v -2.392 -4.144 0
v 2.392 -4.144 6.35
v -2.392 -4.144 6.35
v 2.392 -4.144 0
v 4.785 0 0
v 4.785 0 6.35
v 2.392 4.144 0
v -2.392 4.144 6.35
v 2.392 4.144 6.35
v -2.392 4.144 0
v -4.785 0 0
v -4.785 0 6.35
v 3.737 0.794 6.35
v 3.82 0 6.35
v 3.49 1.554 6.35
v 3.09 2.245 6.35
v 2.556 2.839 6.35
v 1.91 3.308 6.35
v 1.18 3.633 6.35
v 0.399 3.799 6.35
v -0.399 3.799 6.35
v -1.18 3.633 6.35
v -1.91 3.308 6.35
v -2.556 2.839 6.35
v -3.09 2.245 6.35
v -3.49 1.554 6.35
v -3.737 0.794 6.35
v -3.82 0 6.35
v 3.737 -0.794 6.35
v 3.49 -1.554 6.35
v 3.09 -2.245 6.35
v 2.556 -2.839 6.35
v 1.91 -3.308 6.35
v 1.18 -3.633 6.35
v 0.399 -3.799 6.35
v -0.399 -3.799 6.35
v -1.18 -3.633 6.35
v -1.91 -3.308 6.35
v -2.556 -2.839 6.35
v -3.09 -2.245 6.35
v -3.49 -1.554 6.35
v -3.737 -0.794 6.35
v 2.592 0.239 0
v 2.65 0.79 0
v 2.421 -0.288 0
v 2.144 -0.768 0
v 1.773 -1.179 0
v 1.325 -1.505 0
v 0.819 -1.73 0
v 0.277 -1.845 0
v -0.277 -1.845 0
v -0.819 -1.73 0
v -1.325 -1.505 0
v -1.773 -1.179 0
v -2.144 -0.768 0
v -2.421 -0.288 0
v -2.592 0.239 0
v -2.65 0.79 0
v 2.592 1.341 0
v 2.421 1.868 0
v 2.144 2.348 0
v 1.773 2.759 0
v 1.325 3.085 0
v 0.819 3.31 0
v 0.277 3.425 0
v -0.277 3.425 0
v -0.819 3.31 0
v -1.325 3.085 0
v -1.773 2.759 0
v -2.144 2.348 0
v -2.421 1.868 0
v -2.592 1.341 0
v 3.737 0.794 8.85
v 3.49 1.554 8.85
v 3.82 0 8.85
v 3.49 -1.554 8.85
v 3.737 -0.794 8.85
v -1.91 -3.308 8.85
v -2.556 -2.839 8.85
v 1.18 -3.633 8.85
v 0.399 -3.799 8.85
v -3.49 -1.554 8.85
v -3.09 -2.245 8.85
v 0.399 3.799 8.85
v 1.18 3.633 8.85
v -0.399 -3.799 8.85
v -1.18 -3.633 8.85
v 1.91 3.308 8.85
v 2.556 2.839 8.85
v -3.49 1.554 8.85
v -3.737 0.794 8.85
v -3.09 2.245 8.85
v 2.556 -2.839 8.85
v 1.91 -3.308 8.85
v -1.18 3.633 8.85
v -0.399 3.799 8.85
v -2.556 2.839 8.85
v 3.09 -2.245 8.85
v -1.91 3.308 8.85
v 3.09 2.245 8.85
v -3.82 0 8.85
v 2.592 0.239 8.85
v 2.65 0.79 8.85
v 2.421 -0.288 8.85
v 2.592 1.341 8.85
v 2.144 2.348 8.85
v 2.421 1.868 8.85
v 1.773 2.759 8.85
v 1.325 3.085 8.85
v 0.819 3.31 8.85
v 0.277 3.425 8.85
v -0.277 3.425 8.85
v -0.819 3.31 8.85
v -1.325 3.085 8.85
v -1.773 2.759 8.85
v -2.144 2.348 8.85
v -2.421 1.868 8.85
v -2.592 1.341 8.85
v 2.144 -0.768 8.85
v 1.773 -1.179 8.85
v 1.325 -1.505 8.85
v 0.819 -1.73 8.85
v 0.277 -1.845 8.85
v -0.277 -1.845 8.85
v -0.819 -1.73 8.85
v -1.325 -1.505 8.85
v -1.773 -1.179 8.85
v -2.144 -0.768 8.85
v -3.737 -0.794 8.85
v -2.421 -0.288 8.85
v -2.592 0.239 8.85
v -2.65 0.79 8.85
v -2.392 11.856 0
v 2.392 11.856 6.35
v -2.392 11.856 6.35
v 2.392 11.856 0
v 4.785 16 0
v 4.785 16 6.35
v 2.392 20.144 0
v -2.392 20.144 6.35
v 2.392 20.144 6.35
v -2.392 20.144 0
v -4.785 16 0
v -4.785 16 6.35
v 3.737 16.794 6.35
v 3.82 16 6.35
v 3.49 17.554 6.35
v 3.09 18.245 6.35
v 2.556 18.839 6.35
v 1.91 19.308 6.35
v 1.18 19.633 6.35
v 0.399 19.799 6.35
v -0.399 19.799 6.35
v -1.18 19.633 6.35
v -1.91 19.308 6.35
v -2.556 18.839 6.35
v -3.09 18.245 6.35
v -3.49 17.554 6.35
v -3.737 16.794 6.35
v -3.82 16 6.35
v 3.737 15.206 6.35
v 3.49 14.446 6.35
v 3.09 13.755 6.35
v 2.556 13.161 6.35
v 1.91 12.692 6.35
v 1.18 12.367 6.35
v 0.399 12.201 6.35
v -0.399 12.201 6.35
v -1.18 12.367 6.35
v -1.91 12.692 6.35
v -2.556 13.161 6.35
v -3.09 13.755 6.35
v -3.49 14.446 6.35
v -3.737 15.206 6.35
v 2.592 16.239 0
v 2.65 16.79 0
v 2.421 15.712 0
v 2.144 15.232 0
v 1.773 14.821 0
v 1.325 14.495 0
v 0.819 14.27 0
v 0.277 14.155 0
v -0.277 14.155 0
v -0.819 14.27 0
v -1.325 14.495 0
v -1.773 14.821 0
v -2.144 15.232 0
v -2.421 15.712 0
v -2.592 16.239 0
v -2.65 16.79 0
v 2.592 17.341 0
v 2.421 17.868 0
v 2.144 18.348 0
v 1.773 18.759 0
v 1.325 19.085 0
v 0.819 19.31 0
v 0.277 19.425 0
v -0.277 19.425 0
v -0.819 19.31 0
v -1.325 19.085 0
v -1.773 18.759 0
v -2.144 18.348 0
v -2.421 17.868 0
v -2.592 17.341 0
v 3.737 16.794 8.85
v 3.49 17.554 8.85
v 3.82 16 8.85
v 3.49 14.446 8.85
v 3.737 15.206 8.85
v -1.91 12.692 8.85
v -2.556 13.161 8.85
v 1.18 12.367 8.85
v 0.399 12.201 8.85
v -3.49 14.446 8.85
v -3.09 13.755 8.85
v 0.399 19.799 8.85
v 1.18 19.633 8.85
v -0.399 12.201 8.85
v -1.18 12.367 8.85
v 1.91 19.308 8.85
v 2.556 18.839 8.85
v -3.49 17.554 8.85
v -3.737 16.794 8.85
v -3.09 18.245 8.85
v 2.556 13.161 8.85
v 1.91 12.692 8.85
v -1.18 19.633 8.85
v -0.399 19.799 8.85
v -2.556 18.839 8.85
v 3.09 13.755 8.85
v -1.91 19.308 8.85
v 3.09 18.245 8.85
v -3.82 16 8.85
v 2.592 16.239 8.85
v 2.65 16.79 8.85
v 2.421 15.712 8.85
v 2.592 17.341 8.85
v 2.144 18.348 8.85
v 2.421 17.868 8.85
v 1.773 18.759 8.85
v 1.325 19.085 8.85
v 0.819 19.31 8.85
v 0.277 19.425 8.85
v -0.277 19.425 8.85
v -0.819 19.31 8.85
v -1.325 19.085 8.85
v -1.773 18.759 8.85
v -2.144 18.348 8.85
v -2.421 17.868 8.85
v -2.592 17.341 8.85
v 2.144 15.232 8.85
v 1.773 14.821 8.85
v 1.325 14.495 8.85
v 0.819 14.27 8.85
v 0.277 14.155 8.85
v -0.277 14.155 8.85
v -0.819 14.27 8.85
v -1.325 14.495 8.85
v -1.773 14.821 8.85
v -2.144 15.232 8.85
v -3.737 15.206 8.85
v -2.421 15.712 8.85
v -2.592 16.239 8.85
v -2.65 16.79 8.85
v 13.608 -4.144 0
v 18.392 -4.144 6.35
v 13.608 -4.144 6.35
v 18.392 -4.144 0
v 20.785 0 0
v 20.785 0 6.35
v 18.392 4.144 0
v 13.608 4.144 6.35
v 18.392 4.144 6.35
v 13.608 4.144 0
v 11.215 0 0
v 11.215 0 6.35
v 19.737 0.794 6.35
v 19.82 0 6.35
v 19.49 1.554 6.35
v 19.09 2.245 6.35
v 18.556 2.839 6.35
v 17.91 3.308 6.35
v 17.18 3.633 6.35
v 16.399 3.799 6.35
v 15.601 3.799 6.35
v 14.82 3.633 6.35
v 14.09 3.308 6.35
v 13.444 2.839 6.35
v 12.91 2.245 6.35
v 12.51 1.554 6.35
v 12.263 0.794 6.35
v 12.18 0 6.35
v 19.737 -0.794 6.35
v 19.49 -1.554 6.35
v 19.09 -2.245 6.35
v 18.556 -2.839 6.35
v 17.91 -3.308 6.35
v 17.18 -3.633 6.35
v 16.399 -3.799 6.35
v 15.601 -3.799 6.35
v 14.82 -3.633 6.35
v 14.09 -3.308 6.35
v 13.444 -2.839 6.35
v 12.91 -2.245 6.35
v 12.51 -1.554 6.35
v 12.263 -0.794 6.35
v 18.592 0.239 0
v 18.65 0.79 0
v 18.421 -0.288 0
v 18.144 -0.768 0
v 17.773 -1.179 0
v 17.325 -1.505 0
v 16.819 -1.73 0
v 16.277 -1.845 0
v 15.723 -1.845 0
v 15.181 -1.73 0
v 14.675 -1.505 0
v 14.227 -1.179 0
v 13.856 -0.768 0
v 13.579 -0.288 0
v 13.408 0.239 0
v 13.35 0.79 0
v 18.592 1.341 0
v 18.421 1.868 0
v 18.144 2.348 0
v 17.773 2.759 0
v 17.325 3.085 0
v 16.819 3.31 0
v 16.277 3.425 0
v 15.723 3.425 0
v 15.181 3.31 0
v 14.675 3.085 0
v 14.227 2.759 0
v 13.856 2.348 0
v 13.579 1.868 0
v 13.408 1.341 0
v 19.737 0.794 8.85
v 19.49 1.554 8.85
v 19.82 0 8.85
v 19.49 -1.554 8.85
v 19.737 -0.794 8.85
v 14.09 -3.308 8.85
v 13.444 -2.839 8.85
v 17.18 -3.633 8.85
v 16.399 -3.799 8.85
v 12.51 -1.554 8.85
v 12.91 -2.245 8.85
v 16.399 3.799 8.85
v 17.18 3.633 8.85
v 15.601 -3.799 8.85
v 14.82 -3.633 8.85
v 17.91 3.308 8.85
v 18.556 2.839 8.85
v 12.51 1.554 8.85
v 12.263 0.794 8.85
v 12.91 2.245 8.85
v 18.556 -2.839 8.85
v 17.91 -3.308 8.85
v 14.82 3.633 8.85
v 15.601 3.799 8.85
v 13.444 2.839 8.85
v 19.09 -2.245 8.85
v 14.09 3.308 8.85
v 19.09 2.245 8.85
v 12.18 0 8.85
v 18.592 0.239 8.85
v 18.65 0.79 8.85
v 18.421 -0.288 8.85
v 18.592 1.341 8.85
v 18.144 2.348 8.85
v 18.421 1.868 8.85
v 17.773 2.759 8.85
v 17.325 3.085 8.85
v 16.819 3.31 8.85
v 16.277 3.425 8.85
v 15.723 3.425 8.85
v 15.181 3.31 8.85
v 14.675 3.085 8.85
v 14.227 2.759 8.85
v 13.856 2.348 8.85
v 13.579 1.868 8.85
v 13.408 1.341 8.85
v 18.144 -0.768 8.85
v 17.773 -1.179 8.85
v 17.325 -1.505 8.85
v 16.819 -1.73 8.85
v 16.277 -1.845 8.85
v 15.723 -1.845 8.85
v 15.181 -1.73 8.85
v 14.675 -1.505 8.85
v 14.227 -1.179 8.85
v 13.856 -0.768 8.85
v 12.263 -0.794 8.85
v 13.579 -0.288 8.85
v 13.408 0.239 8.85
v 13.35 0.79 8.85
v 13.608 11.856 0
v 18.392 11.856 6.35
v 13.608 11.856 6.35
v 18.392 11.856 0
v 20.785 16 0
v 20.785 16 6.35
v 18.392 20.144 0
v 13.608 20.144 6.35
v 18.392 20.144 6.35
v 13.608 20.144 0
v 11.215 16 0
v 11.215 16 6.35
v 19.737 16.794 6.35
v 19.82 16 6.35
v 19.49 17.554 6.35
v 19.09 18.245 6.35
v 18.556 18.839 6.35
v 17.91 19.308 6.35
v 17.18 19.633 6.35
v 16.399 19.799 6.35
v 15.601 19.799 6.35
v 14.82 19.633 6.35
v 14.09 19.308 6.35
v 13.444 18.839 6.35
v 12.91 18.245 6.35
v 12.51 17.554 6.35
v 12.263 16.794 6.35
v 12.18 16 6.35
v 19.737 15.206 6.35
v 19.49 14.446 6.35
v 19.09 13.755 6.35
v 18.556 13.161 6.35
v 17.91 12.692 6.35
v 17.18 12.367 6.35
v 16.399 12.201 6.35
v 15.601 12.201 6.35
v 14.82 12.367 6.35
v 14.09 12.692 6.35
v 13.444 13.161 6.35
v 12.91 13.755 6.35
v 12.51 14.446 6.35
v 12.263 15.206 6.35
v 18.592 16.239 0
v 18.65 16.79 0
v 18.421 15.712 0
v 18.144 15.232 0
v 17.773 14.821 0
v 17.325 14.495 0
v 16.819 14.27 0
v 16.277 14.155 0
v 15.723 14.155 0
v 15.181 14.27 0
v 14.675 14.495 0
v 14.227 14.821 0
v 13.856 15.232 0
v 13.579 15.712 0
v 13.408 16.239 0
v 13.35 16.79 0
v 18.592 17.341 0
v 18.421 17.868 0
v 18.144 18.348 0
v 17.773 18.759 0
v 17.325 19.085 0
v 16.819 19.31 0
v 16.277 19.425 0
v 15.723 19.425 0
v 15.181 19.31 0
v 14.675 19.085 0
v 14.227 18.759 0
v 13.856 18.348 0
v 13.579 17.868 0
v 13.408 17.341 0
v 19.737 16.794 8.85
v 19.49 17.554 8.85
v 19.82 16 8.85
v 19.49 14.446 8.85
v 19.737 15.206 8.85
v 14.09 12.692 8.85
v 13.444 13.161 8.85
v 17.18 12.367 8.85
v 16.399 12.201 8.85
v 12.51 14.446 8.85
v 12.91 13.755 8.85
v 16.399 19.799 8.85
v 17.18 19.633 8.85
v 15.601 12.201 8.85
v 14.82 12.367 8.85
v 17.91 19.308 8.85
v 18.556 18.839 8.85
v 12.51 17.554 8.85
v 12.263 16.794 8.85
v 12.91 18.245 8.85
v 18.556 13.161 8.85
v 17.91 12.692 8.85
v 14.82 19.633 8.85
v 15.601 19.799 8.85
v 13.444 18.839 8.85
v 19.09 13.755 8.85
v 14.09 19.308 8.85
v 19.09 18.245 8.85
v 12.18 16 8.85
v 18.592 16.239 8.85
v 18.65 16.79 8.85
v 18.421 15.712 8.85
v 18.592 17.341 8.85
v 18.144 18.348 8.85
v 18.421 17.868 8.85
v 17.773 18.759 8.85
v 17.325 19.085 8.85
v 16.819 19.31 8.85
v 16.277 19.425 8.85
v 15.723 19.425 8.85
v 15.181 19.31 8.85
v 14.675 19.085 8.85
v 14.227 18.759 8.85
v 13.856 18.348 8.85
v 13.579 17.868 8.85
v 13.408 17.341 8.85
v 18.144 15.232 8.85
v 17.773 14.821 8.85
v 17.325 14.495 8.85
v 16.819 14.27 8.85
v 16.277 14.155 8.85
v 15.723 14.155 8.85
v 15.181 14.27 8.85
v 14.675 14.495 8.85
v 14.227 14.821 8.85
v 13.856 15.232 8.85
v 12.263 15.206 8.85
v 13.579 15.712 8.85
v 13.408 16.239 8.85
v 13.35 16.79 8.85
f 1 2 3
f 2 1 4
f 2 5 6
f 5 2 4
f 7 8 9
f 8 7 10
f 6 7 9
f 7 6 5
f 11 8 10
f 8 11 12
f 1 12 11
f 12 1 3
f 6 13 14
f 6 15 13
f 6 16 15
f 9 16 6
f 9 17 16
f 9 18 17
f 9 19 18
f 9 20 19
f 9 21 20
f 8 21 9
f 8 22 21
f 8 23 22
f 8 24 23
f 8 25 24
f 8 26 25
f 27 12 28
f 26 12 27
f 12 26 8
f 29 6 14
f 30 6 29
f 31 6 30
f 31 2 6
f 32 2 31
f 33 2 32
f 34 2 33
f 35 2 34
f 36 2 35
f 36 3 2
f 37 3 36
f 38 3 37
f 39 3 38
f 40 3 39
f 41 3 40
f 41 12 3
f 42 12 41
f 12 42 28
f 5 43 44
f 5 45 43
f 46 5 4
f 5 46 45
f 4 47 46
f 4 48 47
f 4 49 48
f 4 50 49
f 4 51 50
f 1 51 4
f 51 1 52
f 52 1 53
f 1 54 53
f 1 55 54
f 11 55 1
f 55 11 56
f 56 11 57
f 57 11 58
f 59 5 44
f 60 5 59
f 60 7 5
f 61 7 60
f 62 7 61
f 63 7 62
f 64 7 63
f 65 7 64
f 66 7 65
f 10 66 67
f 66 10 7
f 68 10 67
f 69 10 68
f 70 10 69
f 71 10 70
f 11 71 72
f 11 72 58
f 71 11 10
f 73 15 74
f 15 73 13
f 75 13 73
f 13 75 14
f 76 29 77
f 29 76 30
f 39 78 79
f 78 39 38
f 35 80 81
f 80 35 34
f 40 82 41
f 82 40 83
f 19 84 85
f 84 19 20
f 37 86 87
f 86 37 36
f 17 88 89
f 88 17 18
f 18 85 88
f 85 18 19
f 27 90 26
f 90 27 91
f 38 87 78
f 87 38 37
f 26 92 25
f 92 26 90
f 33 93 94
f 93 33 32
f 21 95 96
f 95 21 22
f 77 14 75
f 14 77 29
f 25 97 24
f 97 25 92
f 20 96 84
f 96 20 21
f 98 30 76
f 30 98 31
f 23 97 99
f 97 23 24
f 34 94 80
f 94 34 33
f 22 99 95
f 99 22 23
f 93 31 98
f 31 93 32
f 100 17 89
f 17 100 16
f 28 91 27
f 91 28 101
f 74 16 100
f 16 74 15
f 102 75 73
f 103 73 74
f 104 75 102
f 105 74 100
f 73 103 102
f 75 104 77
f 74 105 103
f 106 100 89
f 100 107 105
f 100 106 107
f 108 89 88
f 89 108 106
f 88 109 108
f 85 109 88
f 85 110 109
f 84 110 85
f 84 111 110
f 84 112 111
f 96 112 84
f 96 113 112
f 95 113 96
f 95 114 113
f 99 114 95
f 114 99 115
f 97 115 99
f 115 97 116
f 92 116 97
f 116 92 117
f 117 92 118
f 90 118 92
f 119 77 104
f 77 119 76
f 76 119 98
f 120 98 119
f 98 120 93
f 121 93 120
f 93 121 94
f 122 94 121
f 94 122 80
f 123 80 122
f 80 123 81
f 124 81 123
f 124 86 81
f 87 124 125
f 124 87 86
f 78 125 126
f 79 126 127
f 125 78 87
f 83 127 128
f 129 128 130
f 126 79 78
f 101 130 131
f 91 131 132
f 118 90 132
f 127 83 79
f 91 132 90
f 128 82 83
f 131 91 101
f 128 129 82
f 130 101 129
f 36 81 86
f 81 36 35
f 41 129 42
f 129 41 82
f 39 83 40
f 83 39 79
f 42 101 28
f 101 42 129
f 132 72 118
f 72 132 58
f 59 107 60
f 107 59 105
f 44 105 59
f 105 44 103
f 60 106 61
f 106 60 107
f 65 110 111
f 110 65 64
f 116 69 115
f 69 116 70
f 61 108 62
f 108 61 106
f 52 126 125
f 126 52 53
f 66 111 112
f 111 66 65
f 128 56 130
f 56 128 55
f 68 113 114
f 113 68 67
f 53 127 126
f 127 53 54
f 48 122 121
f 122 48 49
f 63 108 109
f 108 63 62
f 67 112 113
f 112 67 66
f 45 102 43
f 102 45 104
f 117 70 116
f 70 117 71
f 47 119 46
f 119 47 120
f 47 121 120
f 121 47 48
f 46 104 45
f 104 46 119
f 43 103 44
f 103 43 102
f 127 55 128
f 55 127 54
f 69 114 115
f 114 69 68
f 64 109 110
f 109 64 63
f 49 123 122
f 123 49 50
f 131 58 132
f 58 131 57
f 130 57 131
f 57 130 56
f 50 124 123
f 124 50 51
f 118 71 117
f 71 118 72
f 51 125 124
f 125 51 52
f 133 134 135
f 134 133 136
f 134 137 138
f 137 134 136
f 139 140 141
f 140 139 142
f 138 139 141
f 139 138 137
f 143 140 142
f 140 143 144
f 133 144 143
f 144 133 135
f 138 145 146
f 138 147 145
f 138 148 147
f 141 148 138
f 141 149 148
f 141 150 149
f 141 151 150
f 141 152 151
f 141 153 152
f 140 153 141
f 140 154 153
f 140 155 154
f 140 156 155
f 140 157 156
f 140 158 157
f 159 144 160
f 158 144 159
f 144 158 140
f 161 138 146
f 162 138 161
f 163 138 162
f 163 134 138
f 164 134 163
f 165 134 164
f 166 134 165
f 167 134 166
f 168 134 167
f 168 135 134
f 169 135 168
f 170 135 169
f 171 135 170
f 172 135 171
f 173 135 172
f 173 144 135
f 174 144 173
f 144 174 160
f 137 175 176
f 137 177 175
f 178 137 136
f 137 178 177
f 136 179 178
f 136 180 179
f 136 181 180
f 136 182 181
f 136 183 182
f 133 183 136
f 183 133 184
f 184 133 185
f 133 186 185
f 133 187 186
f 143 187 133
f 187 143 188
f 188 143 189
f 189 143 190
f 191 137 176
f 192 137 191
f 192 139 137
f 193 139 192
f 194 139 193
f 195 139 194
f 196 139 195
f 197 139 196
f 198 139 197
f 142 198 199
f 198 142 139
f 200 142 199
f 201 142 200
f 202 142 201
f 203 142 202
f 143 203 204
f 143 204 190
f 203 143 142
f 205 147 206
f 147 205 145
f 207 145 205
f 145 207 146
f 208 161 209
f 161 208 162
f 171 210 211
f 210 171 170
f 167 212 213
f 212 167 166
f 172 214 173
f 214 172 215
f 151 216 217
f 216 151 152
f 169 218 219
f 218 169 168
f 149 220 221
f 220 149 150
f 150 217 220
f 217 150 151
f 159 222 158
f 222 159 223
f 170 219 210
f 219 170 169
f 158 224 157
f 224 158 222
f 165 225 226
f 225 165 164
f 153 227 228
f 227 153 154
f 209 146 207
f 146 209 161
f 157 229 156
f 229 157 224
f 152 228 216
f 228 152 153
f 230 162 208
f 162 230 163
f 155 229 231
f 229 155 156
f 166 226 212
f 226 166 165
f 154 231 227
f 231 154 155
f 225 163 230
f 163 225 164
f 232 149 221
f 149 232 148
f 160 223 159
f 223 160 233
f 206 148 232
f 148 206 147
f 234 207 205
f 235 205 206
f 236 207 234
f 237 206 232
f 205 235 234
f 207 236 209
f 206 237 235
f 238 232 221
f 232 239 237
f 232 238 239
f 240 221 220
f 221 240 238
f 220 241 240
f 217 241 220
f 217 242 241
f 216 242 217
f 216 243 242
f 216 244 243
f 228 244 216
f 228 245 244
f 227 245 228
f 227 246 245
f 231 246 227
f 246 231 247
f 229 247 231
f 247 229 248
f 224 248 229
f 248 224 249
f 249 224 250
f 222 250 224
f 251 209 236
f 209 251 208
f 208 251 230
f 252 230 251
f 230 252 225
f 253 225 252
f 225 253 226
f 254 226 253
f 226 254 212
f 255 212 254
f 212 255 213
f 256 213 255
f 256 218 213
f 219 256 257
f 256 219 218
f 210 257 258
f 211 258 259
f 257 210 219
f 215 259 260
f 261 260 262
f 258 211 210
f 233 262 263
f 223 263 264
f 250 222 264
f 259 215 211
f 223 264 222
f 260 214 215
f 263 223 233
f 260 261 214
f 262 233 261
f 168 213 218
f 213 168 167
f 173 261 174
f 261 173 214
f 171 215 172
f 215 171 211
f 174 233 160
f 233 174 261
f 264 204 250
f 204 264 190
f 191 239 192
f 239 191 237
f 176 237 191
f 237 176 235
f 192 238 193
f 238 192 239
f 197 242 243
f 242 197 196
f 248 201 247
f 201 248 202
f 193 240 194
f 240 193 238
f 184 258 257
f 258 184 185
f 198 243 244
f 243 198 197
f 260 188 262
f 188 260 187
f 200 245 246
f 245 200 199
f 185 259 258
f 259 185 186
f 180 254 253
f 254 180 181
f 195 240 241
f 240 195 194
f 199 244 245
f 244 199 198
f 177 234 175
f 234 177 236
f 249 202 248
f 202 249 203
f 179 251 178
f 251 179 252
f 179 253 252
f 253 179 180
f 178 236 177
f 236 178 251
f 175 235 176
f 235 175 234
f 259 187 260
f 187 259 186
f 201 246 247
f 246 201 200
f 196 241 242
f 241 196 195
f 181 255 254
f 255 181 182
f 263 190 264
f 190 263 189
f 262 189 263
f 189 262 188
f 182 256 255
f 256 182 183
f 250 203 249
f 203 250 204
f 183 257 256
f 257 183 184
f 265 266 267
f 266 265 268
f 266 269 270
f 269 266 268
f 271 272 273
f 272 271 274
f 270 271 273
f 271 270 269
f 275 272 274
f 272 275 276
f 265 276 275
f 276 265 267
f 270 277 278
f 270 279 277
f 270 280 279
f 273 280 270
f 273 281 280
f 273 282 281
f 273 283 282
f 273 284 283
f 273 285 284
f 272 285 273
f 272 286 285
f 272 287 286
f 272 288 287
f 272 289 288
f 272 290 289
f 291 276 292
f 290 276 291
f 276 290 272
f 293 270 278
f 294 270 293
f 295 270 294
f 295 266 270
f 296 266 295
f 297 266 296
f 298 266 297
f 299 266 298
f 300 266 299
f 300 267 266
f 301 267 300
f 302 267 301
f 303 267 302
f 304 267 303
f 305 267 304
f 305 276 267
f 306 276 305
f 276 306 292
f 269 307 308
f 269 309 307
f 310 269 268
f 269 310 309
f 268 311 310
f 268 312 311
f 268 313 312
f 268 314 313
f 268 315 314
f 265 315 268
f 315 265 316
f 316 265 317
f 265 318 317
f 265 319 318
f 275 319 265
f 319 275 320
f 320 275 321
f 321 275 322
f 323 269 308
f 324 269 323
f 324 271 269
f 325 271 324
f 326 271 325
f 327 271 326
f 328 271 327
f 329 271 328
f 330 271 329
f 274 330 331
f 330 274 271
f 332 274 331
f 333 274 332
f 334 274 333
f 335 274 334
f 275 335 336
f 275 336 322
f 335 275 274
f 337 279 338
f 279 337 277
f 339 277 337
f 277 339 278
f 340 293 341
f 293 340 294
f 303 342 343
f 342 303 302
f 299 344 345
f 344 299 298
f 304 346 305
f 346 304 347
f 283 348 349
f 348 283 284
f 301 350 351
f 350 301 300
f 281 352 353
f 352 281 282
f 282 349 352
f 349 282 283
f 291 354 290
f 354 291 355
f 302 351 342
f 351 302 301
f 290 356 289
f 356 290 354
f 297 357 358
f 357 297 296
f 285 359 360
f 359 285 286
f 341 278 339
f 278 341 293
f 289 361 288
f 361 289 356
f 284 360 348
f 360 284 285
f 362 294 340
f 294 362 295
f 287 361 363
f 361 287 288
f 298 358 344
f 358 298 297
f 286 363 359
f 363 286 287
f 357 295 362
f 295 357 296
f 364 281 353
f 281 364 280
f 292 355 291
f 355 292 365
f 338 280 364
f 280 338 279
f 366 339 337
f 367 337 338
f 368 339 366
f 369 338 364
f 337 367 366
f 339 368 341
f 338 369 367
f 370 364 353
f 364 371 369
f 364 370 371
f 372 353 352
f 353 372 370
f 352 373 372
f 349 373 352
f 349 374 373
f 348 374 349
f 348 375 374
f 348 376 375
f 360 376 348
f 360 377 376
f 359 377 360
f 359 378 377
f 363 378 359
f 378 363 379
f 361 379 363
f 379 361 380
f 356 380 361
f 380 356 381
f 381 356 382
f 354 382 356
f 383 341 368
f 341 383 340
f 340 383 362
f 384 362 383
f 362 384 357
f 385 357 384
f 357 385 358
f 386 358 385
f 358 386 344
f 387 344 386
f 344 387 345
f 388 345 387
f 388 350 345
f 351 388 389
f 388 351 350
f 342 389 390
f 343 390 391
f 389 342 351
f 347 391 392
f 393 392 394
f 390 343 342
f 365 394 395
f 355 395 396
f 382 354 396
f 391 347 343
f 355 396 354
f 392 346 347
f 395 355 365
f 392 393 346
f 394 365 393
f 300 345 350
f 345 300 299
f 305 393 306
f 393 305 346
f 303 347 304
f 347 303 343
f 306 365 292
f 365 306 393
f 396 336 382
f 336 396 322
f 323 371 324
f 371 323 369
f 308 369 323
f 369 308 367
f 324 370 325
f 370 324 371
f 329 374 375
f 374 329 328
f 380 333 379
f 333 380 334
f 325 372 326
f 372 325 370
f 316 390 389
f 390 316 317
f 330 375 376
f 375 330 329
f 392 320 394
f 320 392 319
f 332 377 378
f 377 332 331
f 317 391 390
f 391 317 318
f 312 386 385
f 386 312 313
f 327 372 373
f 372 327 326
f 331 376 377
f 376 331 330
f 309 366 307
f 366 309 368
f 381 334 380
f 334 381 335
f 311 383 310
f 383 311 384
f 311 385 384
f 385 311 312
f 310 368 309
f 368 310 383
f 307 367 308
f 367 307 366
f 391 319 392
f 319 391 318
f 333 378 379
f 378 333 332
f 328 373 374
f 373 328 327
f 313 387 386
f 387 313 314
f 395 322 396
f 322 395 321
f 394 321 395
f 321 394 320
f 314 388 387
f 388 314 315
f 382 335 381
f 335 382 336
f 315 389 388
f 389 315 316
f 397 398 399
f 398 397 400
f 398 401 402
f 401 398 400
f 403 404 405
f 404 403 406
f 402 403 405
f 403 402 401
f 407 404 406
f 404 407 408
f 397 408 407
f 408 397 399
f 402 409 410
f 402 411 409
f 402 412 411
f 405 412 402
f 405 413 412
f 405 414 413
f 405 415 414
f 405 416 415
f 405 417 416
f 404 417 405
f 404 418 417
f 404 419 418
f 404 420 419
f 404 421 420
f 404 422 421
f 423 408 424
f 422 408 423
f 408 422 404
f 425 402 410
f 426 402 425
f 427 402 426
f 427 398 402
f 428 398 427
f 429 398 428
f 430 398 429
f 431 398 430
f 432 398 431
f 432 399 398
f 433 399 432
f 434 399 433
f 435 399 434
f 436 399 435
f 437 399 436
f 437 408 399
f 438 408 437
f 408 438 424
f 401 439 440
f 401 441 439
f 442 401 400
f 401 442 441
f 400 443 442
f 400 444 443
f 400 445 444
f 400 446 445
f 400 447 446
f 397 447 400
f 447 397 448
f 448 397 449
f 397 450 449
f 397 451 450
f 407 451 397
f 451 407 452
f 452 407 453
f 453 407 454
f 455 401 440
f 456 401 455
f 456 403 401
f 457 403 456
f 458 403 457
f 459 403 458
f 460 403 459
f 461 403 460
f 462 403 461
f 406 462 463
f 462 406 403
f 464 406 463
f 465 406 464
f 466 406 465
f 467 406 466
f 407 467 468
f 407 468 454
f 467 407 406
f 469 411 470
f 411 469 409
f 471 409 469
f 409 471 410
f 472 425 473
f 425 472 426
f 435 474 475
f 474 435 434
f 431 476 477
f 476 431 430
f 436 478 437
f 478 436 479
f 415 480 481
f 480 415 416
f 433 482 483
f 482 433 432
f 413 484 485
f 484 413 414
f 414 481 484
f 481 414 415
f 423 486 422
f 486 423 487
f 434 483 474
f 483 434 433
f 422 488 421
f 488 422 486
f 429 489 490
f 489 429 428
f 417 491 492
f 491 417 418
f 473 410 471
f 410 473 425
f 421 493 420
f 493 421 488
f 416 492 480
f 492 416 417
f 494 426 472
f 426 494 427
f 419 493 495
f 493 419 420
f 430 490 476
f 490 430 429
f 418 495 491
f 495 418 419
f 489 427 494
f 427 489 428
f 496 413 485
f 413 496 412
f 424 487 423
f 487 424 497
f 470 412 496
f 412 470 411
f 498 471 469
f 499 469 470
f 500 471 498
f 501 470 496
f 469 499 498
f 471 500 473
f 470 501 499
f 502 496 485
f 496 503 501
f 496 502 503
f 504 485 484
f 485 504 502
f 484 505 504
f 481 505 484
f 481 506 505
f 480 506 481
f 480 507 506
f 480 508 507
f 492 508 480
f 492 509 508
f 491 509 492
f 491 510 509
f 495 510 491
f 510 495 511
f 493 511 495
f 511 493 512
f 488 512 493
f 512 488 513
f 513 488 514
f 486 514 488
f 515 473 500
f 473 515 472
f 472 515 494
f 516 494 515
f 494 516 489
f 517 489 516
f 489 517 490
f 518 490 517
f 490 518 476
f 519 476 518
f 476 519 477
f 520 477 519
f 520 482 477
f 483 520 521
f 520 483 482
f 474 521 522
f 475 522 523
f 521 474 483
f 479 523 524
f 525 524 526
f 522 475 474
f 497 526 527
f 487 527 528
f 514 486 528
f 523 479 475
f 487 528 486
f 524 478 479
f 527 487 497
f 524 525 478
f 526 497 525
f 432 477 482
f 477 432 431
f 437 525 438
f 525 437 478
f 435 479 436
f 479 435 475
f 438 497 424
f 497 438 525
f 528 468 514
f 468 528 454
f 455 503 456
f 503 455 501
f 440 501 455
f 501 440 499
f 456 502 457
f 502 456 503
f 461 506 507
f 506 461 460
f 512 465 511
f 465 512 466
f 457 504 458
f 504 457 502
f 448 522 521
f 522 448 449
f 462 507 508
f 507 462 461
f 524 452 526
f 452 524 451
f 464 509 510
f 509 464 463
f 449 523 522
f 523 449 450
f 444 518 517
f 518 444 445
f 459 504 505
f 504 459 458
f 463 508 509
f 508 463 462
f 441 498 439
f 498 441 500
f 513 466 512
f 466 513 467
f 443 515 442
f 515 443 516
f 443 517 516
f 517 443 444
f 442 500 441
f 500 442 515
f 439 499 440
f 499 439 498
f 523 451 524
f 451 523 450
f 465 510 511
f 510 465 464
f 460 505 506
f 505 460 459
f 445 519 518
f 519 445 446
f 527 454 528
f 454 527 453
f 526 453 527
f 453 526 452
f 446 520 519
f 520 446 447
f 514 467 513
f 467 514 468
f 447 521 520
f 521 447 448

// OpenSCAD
// Eccentric Spacer - Makerslice compatible
// as per http://www.buildlog.net/sm_laser/drawings/b18001_rev_3.pdf
//
// CC-BY-SA Licenced under Creative Commons-Share Alike 3.0 Licence
//
//
// modified by @makevoid for more generic m5 spacer - metric 
//
// http://openbuildspartstore.com/eccentric-spacers/
//
// http://cdn1.bigcommerce.com/server2300/itwgldve/products/97/images/1038/Eccentric_Spacer_Version_3__55794.1392409357.1280.1280.jpg?c=1

tol = 0.3; // tolerance, you know, plastic expands

i = 25.4;						// inch
fs = 0.5;						// used for $fs
// mEs = m-makerslide E-Eccentric s-Spacer
mEsHexH =   6.35;			// Hex Height 1/4"
mEsRoundH = 2.50;			// Roung Height - sits inside hole
mEsTotH =   mEsHexH + mEsRoundH;	// Total Height
mEsRoundD = 7.64;			// Round Diameter // maxed
mEsHoleD =  5.0 + tol;		// Hole Diameter based on M5
mEsHoleO =  0.79;			// Hole Offset from center
mEsHexD  =  9.87-tol;		// Hole Hex Diameter M6 wrench


//mEsRoundD = 9;			// Round Diameter // maxed
//mEsHexD  =  12.85-tol;		// Hole Hex Diameter M8 wrench


module spacer() {


  difference() {
	 union() {
		cylinder(r=mEsHexD/2,h=mEsHexH,$fn=6);
	 	cylinder(r=mEsRoundD/2,h=mEsTotH,$fs=fs);
	 } // u
		translate([0,mEsHoleO,-0.1]) 
         cylinder(r=mEsHoleD/2,h=mEsTotH+0.2,$fs=fs);
  } // d
			
}

spacer();
translate([ 0, 16]) spacer();
translate([16,  0]) spacer();
translate([16, 16]) spacer();
